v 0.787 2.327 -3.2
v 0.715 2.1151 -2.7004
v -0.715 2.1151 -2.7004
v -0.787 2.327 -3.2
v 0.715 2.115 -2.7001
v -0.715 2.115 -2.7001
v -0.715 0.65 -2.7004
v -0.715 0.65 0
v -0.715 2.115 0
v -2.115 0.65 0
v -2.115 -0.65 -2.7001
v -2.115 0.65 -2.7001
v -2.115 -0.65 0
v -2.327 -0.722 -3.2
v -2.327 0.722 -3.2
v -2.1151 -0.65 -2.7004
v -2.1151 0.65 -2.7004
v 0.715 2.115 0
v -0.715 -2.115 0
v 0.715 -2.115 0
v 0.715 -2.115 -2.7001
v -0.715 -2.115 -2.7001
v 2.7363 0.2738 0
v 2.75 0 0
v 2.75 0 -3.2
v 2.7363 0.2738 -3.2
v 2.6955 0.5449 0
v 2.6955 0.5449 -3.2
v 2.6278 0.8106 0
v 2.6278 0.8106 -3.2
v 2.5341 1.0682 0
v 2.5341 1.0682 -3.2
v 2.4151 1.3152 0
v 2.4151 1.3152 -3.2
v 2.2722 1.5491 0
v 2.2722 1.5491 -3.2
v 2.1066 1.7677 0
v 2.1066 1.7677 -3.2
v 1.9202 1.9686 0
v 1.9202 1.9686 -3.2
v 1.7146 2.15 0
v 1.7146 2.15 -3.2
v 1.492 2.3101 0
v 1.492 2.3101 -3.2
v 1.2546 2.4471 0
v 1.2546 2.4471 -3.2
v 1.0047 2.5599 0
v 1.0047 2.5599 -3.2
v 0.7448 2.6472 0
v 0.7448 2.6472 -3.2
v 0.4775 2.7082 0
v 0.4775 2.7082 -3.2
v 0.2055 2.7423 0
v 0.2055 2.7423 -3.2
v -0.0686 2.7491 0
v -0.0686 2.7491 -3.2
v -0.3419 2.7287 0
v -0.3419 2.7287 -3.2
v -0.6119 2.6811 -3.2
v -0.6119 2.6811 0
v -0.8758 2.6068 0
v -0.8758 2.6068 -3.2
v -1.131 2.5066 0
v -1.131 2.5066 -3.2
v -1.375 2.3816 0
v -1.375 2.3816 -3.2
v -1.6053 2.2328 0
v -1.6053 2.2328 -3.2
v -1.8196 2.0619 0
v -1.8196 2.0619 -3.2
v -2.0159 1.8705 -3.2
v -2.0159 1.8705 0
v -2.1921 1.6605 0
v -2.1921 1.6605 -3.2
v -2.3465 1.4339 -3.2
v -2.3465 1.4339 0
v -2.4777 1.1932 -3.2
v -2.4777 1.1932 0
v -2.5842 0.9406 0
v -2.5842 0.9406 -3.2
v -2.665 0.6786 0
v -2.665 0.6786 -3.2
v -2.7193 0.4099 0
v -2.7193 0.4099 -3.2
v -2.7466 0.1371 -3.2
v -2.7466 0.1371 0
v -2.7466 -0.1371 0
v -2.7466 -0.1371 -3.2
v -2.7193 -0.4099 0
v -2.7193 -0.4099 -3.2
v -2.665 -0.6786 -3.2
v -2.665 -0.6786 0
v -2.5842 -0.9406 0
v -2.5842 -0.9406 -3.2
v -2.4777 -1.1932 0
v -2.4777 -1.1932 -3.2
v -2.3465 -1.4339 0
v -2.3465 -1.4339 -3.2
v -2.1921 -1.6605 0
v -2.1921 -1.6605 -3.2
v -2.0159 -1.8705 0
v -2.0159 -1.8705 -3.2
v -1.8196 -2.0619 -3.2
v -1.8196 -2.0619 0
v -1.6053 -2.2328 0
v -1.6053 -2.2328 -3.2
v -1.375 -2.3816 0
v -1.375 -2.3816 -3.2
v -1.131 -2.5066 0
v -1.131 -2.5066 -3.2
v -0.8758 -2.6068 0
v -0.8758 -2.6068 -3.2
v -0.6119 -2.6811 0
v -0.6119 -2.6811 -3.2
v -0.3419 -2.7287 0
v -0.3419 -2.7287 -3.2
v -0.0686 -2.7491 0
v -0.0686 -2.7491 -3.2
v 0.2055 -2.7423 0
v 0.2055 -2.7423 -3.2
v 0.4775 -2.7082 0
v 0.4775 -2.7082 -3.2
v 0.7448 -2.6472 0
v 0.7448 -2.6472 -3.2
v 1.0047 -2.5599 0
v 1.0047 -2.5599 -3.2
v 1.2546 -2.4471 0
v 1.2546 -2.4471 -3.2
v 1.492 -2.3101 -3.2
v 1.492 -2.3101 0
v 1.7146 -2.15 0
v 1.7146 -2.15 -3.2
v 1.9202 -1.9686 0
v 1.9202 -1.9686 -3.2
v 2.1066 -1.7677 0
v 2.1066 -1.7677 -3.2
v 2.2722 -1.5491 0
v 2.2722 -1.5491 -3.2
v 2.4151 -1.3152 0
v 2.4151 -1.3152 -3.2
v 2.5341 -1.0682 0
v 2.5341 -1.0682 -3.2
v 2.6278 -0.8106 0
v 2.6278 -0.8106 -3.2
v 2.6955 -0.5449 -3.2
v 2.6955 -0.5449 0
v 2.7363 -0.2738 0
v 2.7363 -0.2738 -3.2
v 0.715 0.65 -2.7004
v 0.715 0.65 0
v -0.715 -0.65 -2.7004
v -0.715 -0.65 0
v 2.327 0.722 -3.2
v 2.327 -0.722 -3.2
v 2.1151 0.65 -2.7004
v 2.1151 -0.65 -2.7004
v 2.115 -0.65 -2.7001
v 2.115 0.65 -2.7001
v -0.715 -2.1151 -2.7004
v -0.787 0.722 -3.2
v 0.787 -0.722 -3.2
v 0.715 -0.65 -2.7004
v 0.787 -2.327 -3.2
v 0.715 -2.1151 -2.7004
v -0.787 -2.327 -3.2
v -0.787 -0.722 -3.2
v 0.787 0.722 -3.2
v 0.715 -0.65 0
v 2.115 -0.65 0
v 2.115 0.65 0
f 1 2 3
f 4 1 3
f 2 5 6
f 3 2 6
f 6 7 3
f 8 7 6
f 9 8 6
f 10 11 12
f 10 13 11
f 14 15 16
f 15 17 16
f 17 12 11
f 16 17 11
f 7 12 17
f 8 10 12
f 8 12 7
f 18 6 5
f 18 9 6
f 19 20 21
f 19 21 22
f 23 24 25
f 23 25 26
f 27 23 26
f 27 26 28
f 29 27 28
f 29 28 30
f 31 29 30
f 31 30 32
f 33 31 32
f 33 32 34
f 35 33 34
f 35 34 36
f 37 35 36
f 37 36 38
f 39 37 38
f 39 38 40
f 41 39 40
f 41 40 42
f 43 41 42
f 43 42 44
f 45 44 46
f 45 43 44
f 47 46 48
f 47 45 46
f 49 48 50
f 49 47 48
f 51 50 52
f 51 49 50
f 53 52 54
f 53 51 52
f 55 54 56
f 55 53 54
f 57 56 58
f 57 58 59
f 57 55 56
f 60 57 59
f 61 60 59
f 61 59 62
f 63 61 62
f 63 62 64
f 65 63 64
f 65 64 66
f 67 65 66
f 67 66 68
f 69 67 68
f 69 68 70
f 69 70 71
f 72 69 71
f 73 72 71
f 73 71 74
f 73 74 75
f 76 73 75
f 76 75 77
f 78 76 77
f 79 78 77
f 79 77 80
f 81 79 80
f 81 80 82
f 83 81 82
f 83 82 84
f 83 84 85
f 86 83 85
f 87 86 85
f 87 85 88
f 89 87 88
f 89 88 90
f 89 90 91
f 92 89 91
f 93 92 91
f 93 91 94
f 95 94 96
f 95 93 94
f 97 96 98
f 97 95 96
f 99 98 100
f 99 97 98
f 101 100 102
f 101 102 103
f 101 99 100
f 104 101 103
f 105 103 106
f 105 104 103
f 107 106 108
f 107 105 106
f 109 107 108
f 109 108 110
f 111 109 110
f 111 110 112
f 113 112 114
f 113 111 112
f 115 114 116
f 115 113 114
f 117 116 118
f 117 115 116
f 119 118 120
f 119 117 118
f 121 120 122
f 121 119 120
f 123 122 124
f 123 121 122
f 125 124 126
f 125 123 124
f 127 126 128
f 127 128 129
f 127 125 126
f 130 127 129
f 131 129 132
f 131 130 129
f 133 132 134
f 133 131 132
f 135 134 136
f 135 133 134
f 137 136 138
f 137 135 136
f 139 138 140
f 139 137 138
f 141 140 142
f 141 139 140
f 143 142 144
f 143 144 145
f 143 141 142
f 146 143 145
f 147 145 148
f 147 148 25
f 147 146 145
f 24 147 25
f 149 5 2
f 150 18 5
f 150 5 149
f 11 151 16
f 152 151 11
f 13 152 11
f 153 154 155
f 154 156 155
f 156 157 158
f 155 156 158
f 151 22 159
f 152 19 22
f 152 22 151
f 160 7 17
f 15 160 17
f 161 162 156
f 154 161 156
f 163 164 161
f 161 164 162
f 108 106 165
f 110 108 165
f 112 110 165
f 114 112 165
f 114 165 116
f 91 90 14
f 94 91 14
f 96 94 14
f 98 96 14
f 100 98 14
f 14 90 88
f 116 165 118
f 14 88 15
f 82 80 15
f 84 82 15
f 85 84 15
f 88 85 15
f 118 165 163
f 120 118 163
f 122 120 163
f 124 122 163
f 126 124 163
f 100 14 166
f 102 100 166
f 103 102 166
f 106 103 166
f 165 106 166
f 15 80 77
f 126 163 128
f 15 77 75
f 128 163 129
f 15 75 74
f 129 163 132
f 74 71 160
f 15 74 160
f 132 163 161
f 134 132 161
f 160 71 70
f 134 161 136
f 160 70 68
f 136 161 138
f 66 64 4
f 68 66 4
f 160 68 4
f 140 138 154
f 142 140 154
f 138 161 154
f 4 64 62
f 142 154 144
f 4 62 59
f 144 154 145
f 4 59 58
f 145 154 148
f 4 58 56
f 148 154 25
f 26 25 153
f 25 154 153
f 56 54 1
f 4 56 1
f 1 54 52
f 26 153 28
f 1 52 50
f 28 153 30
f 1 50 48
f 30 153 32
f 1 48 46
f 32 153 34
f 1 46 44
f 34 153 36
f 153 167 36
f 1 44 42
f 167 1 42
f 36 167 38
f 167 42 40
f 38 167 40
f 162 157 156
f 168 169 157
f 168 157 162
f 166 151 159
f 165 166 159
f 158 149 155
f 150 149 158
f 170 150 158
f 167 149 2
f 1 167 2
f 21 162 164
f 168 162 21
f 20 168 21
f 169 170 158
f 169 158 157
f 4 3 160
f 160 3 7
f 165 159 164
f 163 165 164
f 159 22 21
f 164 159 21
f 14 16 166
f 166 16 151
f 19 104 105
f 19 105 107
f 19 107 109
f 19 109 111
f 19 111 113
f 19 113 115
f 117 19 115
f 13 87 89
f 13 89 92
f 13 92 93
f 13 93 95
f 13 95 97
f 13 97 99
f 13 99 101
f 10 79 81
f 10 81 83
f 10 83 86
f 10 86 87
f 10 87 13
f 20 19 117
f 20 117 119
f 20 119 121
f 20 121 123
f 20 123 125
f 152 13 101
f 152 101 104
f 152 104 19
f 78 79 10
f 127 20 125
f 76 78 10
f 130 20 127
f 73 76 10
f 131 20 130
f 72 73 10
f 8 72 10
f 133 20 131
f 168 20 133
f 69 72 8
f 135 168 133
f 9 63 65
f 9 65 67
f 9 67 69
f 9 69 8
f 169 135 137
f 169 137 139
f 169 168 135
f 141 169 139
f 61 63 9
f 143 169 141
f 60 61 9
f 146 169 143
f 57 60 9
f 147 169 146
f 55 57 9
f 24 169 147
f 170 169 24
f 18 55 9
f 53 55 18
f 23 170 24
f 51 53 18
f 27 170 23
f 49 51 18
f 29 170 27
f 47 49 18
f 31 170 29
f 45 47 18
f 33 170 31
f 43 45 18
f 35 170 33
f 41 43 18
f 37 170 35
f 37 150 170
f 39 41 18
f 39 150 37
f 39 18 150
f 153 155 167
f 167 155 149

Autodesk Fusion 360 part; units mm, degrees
sketch "Sketch1" plane through (0, 0, 0) normal (0, 0, 1) x (1, 0, 0)
  line L0 (-0.715, 2.115) -> (0.715, 2.115)
  line L1 (0.715, 2.115) -> (0.715, -2.115)
  line L2 (0.715, -2.115) -> (-0.715, -2.115)
  line L3 (-0.715, -2.115) -> (-0.715, 2.115)
  line L4 (-0.715, 2.115) -> (0.715, -2.115) construction
  line L5 (0.715, 2.115) -> (-0.715, -2.115) construction
  line L6 (-2.115, 0.65) -> (2.115, 0.65)
  line L7 (2.115, 0.65) -> (2.115, -0.65)
  line L8 (2.115, -0.65) -> (-2.115, -0.65)
  line L9 (-2.115, -0.65) -> (-2.115, 0.65)
  line L10 (-2.115, 0.65) -> (2.115, -0.65) construction
  line L11 (2.115, 0.65) -> (-2.115, -0.65) construction
  circle A0 centre (0, 0) radius 2.75
  dimension "d21" = 1.43
  dimension "d22" = 4.23
  dimension "d23" = 4.23
  dimension "d24" = 1.3
  dimension "d25" = 5.5
extrude "Extrude1" add sketch "Sketch1" against normal blind 3.2
chamfer "Chamfer1" distance 0.212 angle 67.02 4 edges at (-2.115, 0, -3.2) (2.115, 0, -3.2) (0, -2.115, -3.2) (0, 2.115, -3.2) measured on face at (-1.6153, -1.0568, -3.2) measured on face at (-1.6153, -1.0568, -3.2) measured on face at (-1.6153, -1.0568, -3.2) measured on face at (-1.6153, -1.0568, -3.2)
chamfer "Chamfer2" distance 0.072 angle 81.8 8 edges at (0.715, 1.4885, -3.2) (1.521, 0.65, -3.2) (1.521, -0.65, -3.2) (0.715, -1.4885, -3.2) (-0.715, -1.4885, -3.2) (-1.521, -0.65, -3.2) (-1.521, 0.65, -3.2) (-0.715, 1.4885, -3.2) measured on face at (-1.0482, 1.709, -3.2) measured on face at (-1.0482, 1.709, -3.2) measured on face at (-1.0482, 1.709, -3.2) measured on face at (-1.0482, 1.709, -3.2) measured on face at (-1.0482, 1.709, -3.2) measured on face at (-1.0482, 1.709, -3.2) measured on face at (-1.0482, 1.709, -3.2) measured on face at (-1.0482, 1.709, -3.2)
equation "width = 5.5 mm"
equation "depth = 5.5 mm"
equation "cross_xy = 4.23 mm"
equation "gap_x = 1.3 mm"
equation "gap_y = 1.43 mm"
equation "height = 3.2 mm" comment "3.7 for mx. 3.3 for choc v2"
equation "d13 = -height"
equation "d15 = chamfer_cross"
equation "d16 = chamfer_cross_angle"
equation "d17 = chamfer_gap"
equation "d18 = chamfer_gap_angle"
equation "d21 = gap_y"
equation "d22 = cross_xy"
equation "d23 = cross_xy"
equation "d24 = gap_x"
equation "d25 = width"
equation "chamfer_cross_angle = 67.02 deg"
equation "chamfer_cross = 0.212 mm"
equation "chamfer_gap_angle = 81.8 deg"
equation "chamfer_gap = 0.072 mm"
